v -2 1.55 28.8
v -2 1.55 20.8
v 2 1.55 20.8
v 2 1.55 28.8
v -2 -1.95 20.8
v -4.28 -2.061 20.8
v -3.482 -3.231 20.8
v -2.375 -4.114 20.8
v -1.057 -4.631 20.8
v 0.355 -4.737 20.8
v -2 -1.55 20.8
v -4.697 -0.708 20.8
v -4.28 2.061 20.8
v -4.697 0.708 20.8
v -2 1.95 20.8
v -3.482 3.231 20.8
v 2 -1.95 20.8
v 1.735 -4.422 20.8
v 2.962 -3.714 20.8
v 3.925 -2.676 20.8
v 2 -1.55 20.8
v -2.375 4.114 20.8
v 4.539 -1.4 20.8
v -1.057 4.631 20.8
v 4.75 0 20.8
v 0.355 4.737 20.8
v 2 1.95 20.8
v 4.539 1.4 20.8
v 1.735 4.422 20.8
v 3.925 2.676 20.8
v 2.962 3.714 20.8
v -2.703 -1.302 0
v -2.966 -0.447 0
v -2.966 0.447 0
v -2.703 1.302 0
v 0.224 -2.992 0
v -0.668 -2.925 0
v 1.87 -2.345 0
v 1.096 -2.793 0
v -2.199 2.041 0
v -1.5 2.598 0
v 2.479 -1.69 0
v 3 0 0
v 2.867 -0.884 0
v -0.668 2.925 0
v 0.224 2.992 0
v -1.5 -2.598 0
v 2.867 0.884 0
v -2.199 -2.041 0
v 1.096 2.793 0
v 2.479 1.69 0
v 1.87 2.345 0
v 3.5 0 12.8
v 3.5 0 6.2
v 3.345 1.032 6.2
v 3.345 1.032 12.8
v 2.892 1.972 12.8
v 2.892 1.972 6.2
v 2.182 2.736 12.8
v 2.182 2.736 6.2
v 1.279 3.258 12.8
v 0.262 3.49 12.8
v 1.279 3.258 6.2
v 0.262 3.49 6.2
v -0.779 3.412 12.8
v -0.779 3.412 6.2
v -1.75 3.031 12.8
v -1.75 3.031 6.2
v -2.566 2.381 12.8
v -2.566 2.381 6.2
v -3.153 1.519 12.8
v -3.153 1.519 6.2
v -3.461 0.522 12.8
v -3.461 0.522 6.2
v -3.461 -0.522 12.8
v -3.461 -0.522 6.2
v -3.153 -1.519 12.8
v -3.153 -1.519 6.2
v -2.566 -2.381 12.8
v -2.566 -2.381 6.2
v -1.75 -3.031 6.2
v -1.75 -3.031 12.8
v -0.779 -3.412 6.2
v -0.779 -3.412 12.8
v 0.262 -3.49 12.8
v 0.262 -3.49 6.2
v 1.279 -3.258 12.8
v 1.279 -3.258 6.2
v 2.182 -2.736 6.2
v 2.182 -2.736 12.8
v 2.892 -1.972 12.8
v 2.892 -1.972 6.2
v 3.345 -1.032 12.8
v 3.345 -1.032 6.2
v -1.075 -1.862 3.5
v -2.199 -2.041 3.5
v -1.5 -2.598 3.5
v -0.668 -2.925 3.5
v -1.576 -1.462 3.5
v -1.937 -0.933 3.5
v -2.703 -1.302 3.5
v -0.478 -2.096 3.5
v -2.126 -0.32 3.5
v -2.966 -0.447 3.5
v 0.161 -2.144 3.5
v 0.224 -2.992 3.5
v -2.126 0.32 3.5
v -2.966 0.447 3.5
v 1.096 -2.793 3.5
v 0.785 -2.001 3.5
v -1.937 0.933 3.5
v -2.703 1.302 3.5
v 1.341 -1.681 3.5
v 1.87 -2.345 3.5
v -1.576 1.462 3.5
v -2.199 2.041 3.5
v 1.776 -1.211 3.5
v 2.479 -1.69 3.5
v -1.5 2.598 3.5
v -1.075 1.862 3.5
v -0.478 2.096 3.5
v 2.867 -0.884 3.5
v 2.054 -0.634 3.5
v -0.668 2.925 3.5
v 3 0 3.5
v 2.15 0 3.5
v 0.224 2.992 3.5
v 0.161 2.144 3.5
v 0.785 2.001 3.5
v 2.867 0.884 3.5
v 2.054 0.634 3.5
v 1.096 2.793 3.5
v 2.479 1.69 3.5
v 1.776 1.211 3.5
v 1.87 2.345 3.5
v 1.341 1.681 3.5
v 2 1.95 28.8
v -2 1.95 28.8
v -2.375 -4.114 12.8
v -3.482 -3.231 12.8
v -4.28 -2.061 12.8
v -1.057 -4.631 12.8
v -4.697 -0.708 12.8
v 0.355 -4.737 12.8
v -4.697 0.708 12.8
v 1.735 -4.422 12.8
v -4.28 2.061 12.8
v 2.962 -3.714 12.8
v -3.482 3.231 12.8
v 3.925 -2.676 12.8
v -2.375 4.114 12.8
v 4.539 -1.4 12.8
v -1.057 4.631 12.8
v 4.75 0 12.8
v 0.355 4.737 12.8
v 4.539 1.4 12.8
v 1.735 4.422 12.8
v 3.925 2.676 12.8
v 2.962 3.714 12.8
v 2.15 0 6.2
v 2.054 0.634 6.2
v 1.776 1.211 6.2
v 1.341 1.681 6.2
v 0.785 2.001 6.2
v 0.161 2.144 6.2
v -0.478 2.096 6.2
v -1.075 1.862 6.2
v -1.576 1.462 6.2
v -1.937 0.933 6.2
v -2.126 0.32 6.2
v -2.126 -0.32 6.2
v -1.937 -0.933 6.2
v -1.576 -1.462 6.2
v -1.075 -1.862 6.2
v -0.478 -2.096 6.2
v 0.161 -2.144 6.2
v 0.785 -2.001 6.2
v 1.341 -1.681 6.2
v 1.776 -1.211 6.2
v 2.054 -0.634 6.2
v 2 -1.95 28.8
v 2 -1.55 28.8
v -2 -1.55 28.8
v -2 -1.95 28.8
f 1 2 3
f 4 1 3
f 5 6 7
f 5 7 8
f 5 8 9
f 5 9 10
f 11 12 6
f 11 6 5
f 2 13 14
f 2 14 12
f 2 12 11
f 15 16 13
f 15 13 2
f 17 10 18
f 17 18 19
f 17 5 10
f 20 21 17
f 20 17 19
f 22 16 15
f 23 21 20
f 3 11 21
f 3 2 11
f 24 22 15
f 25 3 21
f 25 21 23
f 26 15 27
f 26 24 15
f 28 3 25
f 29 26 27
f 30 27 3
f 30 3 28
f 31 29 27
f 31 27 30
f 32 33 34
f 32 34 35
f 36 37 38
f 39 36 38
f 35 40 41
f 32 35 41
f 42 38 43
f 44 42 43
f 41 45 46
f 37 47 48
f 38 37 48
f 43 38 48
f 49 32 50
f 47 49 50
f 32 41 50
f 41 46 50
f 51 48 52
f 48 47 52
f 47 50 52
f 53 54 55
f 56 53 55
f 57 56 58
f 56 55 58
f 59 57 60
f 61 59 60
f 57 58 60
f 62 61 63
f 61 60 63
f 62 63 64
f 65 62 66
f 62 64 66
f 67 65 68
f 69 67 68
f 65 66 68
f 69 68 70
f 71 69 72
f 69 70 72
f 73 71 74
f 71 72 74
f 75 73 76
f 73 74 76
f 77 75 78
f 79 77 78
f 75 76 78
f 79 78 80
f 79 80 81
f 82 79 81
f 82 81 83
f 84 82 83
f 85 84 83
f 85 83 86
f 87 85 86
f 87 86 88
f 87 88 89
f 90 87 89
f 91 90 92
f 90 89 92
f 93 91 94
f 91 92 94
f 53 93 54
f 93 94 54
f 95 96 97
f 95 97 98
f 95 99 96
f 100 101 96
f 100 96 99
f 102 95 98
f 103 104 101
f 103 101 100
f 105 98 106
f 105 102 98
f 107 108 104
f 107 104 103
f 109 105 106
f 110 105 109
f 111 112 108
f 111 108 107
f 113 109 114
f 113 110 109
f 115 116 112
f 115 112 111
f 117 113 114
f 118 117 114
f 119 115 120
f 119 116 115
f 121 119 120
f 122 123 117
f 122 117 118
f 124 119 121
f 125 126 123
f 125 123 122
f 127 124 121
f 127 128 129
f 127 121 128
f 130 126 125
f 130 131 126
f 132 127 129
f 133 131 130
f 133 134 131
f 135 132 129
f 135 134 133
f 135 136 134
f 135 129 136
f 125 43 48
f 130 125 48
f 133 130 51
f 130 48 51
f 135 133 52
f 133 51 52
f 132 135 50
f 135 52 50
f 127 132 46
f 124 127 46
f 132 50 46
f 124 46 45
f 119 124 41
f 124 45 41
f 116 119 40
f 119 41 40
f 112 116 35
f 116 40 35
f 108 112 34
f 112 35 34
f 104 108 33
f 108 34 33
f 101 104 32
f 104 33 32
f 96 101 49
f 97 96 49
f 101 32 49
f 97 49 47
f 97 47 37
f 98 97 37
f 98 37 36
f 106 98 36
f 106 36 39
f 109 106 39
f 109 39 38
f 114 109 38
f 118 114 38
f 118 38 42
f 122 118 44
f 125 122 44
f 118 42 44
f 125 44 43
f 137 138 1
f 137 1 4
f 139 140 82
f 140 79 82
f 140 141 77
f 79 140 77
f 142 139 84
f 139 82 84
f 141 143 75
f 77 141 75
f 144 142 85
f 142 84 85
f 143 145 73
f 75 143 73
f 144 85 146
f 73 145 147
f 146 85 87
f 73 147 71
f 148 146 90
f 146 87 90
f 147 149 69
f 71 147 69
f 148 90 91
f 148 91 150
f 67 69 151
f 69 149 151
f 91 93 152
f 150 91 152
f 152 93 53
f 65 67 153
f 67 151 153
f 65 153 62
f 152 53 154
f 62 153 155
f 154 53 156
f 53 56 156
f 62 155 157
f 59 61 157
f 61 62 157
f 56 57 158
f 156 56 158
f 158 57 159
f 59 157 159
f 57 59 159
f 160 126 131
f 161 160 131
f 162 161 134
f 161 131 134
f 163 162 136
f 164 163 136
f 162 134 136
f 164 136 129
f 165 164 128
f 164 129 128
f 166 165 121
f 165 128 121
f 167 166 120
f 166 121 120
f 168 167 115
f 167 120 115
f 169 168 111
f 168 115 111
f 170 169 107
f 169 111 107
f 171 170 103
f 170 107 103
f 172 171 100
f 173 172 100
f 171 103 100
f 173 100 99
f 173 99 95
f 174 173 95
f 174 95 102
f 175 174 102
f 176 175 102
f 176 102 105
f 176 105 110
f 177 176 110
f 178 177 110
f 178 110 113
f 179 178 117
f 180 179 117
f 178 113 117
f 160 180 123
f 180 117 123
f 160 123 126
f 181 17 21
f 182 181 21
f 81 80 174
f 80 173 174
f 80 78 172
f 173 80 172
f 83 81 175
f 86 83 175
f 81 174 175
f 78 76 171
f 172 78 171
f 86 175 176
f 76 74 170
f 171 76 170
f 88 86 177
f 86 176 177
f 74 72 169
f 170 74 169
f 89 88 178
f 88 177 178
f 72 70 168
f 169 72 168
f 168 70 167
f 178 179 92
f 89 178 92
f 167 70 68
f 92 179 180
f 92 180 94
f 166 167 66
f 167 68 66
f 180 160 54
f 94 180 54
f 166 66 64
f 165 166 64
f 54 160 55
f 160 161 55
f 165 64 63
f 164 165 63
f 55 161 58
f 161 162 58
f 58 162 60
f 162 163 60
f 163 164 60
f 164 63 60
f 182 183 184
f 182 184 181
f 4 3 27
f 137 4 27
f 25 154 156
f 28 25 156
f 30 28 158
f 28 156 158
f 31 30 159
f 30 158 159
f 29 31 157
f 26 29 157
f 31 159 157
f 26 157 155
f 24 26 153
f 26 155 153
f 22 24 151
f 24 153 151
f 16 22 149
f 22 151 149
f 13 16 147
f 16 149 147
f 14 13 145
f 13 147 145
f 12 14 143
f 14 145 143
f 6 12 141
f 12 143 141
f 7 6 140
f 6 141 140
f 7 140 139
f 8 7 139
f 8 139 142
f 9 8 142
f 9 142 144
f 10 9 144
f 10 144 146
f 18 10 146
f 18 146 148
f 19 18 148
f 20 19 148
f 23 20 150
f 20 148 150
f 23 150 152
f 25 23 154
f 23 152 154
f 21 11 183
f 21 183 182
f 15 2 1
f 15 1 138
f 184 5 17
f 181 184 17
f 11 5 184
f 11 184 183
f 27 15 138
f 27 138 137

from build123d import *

# Parameters (mm, degrees)
F0_R     = 3
F1_DEPTH = 3.5
F2_R     = 2.15
F3_DEPTH = 2.7
F4_R     = 3.5
F5_DEPTH = 6.6
F6_R     = 4.75
F7_DEPTH = 8
F8_W     = 4
F8_H     = 0.4
F9_DEPTH = 8


with BuildPart() as f1:
    # F0 (on Top) → F1 (new body)
    with BuildSketch(Plane.XY):
        Circle(F0_R)
    extrude(amount=F1_DEPTH)

    # F2 (on face) → F3 (join)
    with BuildSketch(Plane.XY.offset(3.5)):
        Circle(F2_R)
    extrude(amount=F3_DEPTH)

    # F4 (on face) → F5 (join)
    with BuildSketch(Plane.XY.offset(6.2)):
        Circle(F4_R)
    extrude(amount=F5_DEPTH)

    # F6 (on face) → F7 (join)
    with BuildSketch(Plane.XY.offset(12.8)):
        Circle(F6_R)
    extrude(amount=F7_DEPTH)

    # F8 (on face) → F9 (join)
    with BuildSketch(Plane.XY.offset(20.8)):
        with Locations((0, -1.75)):
            Rectangle(F8_W, F8_H)
        with Locations((0, 1.75)):
            Rectangle(F8_W, F8_H)
    extrude(amount=F9_DEPTH)


solid = f1.part
